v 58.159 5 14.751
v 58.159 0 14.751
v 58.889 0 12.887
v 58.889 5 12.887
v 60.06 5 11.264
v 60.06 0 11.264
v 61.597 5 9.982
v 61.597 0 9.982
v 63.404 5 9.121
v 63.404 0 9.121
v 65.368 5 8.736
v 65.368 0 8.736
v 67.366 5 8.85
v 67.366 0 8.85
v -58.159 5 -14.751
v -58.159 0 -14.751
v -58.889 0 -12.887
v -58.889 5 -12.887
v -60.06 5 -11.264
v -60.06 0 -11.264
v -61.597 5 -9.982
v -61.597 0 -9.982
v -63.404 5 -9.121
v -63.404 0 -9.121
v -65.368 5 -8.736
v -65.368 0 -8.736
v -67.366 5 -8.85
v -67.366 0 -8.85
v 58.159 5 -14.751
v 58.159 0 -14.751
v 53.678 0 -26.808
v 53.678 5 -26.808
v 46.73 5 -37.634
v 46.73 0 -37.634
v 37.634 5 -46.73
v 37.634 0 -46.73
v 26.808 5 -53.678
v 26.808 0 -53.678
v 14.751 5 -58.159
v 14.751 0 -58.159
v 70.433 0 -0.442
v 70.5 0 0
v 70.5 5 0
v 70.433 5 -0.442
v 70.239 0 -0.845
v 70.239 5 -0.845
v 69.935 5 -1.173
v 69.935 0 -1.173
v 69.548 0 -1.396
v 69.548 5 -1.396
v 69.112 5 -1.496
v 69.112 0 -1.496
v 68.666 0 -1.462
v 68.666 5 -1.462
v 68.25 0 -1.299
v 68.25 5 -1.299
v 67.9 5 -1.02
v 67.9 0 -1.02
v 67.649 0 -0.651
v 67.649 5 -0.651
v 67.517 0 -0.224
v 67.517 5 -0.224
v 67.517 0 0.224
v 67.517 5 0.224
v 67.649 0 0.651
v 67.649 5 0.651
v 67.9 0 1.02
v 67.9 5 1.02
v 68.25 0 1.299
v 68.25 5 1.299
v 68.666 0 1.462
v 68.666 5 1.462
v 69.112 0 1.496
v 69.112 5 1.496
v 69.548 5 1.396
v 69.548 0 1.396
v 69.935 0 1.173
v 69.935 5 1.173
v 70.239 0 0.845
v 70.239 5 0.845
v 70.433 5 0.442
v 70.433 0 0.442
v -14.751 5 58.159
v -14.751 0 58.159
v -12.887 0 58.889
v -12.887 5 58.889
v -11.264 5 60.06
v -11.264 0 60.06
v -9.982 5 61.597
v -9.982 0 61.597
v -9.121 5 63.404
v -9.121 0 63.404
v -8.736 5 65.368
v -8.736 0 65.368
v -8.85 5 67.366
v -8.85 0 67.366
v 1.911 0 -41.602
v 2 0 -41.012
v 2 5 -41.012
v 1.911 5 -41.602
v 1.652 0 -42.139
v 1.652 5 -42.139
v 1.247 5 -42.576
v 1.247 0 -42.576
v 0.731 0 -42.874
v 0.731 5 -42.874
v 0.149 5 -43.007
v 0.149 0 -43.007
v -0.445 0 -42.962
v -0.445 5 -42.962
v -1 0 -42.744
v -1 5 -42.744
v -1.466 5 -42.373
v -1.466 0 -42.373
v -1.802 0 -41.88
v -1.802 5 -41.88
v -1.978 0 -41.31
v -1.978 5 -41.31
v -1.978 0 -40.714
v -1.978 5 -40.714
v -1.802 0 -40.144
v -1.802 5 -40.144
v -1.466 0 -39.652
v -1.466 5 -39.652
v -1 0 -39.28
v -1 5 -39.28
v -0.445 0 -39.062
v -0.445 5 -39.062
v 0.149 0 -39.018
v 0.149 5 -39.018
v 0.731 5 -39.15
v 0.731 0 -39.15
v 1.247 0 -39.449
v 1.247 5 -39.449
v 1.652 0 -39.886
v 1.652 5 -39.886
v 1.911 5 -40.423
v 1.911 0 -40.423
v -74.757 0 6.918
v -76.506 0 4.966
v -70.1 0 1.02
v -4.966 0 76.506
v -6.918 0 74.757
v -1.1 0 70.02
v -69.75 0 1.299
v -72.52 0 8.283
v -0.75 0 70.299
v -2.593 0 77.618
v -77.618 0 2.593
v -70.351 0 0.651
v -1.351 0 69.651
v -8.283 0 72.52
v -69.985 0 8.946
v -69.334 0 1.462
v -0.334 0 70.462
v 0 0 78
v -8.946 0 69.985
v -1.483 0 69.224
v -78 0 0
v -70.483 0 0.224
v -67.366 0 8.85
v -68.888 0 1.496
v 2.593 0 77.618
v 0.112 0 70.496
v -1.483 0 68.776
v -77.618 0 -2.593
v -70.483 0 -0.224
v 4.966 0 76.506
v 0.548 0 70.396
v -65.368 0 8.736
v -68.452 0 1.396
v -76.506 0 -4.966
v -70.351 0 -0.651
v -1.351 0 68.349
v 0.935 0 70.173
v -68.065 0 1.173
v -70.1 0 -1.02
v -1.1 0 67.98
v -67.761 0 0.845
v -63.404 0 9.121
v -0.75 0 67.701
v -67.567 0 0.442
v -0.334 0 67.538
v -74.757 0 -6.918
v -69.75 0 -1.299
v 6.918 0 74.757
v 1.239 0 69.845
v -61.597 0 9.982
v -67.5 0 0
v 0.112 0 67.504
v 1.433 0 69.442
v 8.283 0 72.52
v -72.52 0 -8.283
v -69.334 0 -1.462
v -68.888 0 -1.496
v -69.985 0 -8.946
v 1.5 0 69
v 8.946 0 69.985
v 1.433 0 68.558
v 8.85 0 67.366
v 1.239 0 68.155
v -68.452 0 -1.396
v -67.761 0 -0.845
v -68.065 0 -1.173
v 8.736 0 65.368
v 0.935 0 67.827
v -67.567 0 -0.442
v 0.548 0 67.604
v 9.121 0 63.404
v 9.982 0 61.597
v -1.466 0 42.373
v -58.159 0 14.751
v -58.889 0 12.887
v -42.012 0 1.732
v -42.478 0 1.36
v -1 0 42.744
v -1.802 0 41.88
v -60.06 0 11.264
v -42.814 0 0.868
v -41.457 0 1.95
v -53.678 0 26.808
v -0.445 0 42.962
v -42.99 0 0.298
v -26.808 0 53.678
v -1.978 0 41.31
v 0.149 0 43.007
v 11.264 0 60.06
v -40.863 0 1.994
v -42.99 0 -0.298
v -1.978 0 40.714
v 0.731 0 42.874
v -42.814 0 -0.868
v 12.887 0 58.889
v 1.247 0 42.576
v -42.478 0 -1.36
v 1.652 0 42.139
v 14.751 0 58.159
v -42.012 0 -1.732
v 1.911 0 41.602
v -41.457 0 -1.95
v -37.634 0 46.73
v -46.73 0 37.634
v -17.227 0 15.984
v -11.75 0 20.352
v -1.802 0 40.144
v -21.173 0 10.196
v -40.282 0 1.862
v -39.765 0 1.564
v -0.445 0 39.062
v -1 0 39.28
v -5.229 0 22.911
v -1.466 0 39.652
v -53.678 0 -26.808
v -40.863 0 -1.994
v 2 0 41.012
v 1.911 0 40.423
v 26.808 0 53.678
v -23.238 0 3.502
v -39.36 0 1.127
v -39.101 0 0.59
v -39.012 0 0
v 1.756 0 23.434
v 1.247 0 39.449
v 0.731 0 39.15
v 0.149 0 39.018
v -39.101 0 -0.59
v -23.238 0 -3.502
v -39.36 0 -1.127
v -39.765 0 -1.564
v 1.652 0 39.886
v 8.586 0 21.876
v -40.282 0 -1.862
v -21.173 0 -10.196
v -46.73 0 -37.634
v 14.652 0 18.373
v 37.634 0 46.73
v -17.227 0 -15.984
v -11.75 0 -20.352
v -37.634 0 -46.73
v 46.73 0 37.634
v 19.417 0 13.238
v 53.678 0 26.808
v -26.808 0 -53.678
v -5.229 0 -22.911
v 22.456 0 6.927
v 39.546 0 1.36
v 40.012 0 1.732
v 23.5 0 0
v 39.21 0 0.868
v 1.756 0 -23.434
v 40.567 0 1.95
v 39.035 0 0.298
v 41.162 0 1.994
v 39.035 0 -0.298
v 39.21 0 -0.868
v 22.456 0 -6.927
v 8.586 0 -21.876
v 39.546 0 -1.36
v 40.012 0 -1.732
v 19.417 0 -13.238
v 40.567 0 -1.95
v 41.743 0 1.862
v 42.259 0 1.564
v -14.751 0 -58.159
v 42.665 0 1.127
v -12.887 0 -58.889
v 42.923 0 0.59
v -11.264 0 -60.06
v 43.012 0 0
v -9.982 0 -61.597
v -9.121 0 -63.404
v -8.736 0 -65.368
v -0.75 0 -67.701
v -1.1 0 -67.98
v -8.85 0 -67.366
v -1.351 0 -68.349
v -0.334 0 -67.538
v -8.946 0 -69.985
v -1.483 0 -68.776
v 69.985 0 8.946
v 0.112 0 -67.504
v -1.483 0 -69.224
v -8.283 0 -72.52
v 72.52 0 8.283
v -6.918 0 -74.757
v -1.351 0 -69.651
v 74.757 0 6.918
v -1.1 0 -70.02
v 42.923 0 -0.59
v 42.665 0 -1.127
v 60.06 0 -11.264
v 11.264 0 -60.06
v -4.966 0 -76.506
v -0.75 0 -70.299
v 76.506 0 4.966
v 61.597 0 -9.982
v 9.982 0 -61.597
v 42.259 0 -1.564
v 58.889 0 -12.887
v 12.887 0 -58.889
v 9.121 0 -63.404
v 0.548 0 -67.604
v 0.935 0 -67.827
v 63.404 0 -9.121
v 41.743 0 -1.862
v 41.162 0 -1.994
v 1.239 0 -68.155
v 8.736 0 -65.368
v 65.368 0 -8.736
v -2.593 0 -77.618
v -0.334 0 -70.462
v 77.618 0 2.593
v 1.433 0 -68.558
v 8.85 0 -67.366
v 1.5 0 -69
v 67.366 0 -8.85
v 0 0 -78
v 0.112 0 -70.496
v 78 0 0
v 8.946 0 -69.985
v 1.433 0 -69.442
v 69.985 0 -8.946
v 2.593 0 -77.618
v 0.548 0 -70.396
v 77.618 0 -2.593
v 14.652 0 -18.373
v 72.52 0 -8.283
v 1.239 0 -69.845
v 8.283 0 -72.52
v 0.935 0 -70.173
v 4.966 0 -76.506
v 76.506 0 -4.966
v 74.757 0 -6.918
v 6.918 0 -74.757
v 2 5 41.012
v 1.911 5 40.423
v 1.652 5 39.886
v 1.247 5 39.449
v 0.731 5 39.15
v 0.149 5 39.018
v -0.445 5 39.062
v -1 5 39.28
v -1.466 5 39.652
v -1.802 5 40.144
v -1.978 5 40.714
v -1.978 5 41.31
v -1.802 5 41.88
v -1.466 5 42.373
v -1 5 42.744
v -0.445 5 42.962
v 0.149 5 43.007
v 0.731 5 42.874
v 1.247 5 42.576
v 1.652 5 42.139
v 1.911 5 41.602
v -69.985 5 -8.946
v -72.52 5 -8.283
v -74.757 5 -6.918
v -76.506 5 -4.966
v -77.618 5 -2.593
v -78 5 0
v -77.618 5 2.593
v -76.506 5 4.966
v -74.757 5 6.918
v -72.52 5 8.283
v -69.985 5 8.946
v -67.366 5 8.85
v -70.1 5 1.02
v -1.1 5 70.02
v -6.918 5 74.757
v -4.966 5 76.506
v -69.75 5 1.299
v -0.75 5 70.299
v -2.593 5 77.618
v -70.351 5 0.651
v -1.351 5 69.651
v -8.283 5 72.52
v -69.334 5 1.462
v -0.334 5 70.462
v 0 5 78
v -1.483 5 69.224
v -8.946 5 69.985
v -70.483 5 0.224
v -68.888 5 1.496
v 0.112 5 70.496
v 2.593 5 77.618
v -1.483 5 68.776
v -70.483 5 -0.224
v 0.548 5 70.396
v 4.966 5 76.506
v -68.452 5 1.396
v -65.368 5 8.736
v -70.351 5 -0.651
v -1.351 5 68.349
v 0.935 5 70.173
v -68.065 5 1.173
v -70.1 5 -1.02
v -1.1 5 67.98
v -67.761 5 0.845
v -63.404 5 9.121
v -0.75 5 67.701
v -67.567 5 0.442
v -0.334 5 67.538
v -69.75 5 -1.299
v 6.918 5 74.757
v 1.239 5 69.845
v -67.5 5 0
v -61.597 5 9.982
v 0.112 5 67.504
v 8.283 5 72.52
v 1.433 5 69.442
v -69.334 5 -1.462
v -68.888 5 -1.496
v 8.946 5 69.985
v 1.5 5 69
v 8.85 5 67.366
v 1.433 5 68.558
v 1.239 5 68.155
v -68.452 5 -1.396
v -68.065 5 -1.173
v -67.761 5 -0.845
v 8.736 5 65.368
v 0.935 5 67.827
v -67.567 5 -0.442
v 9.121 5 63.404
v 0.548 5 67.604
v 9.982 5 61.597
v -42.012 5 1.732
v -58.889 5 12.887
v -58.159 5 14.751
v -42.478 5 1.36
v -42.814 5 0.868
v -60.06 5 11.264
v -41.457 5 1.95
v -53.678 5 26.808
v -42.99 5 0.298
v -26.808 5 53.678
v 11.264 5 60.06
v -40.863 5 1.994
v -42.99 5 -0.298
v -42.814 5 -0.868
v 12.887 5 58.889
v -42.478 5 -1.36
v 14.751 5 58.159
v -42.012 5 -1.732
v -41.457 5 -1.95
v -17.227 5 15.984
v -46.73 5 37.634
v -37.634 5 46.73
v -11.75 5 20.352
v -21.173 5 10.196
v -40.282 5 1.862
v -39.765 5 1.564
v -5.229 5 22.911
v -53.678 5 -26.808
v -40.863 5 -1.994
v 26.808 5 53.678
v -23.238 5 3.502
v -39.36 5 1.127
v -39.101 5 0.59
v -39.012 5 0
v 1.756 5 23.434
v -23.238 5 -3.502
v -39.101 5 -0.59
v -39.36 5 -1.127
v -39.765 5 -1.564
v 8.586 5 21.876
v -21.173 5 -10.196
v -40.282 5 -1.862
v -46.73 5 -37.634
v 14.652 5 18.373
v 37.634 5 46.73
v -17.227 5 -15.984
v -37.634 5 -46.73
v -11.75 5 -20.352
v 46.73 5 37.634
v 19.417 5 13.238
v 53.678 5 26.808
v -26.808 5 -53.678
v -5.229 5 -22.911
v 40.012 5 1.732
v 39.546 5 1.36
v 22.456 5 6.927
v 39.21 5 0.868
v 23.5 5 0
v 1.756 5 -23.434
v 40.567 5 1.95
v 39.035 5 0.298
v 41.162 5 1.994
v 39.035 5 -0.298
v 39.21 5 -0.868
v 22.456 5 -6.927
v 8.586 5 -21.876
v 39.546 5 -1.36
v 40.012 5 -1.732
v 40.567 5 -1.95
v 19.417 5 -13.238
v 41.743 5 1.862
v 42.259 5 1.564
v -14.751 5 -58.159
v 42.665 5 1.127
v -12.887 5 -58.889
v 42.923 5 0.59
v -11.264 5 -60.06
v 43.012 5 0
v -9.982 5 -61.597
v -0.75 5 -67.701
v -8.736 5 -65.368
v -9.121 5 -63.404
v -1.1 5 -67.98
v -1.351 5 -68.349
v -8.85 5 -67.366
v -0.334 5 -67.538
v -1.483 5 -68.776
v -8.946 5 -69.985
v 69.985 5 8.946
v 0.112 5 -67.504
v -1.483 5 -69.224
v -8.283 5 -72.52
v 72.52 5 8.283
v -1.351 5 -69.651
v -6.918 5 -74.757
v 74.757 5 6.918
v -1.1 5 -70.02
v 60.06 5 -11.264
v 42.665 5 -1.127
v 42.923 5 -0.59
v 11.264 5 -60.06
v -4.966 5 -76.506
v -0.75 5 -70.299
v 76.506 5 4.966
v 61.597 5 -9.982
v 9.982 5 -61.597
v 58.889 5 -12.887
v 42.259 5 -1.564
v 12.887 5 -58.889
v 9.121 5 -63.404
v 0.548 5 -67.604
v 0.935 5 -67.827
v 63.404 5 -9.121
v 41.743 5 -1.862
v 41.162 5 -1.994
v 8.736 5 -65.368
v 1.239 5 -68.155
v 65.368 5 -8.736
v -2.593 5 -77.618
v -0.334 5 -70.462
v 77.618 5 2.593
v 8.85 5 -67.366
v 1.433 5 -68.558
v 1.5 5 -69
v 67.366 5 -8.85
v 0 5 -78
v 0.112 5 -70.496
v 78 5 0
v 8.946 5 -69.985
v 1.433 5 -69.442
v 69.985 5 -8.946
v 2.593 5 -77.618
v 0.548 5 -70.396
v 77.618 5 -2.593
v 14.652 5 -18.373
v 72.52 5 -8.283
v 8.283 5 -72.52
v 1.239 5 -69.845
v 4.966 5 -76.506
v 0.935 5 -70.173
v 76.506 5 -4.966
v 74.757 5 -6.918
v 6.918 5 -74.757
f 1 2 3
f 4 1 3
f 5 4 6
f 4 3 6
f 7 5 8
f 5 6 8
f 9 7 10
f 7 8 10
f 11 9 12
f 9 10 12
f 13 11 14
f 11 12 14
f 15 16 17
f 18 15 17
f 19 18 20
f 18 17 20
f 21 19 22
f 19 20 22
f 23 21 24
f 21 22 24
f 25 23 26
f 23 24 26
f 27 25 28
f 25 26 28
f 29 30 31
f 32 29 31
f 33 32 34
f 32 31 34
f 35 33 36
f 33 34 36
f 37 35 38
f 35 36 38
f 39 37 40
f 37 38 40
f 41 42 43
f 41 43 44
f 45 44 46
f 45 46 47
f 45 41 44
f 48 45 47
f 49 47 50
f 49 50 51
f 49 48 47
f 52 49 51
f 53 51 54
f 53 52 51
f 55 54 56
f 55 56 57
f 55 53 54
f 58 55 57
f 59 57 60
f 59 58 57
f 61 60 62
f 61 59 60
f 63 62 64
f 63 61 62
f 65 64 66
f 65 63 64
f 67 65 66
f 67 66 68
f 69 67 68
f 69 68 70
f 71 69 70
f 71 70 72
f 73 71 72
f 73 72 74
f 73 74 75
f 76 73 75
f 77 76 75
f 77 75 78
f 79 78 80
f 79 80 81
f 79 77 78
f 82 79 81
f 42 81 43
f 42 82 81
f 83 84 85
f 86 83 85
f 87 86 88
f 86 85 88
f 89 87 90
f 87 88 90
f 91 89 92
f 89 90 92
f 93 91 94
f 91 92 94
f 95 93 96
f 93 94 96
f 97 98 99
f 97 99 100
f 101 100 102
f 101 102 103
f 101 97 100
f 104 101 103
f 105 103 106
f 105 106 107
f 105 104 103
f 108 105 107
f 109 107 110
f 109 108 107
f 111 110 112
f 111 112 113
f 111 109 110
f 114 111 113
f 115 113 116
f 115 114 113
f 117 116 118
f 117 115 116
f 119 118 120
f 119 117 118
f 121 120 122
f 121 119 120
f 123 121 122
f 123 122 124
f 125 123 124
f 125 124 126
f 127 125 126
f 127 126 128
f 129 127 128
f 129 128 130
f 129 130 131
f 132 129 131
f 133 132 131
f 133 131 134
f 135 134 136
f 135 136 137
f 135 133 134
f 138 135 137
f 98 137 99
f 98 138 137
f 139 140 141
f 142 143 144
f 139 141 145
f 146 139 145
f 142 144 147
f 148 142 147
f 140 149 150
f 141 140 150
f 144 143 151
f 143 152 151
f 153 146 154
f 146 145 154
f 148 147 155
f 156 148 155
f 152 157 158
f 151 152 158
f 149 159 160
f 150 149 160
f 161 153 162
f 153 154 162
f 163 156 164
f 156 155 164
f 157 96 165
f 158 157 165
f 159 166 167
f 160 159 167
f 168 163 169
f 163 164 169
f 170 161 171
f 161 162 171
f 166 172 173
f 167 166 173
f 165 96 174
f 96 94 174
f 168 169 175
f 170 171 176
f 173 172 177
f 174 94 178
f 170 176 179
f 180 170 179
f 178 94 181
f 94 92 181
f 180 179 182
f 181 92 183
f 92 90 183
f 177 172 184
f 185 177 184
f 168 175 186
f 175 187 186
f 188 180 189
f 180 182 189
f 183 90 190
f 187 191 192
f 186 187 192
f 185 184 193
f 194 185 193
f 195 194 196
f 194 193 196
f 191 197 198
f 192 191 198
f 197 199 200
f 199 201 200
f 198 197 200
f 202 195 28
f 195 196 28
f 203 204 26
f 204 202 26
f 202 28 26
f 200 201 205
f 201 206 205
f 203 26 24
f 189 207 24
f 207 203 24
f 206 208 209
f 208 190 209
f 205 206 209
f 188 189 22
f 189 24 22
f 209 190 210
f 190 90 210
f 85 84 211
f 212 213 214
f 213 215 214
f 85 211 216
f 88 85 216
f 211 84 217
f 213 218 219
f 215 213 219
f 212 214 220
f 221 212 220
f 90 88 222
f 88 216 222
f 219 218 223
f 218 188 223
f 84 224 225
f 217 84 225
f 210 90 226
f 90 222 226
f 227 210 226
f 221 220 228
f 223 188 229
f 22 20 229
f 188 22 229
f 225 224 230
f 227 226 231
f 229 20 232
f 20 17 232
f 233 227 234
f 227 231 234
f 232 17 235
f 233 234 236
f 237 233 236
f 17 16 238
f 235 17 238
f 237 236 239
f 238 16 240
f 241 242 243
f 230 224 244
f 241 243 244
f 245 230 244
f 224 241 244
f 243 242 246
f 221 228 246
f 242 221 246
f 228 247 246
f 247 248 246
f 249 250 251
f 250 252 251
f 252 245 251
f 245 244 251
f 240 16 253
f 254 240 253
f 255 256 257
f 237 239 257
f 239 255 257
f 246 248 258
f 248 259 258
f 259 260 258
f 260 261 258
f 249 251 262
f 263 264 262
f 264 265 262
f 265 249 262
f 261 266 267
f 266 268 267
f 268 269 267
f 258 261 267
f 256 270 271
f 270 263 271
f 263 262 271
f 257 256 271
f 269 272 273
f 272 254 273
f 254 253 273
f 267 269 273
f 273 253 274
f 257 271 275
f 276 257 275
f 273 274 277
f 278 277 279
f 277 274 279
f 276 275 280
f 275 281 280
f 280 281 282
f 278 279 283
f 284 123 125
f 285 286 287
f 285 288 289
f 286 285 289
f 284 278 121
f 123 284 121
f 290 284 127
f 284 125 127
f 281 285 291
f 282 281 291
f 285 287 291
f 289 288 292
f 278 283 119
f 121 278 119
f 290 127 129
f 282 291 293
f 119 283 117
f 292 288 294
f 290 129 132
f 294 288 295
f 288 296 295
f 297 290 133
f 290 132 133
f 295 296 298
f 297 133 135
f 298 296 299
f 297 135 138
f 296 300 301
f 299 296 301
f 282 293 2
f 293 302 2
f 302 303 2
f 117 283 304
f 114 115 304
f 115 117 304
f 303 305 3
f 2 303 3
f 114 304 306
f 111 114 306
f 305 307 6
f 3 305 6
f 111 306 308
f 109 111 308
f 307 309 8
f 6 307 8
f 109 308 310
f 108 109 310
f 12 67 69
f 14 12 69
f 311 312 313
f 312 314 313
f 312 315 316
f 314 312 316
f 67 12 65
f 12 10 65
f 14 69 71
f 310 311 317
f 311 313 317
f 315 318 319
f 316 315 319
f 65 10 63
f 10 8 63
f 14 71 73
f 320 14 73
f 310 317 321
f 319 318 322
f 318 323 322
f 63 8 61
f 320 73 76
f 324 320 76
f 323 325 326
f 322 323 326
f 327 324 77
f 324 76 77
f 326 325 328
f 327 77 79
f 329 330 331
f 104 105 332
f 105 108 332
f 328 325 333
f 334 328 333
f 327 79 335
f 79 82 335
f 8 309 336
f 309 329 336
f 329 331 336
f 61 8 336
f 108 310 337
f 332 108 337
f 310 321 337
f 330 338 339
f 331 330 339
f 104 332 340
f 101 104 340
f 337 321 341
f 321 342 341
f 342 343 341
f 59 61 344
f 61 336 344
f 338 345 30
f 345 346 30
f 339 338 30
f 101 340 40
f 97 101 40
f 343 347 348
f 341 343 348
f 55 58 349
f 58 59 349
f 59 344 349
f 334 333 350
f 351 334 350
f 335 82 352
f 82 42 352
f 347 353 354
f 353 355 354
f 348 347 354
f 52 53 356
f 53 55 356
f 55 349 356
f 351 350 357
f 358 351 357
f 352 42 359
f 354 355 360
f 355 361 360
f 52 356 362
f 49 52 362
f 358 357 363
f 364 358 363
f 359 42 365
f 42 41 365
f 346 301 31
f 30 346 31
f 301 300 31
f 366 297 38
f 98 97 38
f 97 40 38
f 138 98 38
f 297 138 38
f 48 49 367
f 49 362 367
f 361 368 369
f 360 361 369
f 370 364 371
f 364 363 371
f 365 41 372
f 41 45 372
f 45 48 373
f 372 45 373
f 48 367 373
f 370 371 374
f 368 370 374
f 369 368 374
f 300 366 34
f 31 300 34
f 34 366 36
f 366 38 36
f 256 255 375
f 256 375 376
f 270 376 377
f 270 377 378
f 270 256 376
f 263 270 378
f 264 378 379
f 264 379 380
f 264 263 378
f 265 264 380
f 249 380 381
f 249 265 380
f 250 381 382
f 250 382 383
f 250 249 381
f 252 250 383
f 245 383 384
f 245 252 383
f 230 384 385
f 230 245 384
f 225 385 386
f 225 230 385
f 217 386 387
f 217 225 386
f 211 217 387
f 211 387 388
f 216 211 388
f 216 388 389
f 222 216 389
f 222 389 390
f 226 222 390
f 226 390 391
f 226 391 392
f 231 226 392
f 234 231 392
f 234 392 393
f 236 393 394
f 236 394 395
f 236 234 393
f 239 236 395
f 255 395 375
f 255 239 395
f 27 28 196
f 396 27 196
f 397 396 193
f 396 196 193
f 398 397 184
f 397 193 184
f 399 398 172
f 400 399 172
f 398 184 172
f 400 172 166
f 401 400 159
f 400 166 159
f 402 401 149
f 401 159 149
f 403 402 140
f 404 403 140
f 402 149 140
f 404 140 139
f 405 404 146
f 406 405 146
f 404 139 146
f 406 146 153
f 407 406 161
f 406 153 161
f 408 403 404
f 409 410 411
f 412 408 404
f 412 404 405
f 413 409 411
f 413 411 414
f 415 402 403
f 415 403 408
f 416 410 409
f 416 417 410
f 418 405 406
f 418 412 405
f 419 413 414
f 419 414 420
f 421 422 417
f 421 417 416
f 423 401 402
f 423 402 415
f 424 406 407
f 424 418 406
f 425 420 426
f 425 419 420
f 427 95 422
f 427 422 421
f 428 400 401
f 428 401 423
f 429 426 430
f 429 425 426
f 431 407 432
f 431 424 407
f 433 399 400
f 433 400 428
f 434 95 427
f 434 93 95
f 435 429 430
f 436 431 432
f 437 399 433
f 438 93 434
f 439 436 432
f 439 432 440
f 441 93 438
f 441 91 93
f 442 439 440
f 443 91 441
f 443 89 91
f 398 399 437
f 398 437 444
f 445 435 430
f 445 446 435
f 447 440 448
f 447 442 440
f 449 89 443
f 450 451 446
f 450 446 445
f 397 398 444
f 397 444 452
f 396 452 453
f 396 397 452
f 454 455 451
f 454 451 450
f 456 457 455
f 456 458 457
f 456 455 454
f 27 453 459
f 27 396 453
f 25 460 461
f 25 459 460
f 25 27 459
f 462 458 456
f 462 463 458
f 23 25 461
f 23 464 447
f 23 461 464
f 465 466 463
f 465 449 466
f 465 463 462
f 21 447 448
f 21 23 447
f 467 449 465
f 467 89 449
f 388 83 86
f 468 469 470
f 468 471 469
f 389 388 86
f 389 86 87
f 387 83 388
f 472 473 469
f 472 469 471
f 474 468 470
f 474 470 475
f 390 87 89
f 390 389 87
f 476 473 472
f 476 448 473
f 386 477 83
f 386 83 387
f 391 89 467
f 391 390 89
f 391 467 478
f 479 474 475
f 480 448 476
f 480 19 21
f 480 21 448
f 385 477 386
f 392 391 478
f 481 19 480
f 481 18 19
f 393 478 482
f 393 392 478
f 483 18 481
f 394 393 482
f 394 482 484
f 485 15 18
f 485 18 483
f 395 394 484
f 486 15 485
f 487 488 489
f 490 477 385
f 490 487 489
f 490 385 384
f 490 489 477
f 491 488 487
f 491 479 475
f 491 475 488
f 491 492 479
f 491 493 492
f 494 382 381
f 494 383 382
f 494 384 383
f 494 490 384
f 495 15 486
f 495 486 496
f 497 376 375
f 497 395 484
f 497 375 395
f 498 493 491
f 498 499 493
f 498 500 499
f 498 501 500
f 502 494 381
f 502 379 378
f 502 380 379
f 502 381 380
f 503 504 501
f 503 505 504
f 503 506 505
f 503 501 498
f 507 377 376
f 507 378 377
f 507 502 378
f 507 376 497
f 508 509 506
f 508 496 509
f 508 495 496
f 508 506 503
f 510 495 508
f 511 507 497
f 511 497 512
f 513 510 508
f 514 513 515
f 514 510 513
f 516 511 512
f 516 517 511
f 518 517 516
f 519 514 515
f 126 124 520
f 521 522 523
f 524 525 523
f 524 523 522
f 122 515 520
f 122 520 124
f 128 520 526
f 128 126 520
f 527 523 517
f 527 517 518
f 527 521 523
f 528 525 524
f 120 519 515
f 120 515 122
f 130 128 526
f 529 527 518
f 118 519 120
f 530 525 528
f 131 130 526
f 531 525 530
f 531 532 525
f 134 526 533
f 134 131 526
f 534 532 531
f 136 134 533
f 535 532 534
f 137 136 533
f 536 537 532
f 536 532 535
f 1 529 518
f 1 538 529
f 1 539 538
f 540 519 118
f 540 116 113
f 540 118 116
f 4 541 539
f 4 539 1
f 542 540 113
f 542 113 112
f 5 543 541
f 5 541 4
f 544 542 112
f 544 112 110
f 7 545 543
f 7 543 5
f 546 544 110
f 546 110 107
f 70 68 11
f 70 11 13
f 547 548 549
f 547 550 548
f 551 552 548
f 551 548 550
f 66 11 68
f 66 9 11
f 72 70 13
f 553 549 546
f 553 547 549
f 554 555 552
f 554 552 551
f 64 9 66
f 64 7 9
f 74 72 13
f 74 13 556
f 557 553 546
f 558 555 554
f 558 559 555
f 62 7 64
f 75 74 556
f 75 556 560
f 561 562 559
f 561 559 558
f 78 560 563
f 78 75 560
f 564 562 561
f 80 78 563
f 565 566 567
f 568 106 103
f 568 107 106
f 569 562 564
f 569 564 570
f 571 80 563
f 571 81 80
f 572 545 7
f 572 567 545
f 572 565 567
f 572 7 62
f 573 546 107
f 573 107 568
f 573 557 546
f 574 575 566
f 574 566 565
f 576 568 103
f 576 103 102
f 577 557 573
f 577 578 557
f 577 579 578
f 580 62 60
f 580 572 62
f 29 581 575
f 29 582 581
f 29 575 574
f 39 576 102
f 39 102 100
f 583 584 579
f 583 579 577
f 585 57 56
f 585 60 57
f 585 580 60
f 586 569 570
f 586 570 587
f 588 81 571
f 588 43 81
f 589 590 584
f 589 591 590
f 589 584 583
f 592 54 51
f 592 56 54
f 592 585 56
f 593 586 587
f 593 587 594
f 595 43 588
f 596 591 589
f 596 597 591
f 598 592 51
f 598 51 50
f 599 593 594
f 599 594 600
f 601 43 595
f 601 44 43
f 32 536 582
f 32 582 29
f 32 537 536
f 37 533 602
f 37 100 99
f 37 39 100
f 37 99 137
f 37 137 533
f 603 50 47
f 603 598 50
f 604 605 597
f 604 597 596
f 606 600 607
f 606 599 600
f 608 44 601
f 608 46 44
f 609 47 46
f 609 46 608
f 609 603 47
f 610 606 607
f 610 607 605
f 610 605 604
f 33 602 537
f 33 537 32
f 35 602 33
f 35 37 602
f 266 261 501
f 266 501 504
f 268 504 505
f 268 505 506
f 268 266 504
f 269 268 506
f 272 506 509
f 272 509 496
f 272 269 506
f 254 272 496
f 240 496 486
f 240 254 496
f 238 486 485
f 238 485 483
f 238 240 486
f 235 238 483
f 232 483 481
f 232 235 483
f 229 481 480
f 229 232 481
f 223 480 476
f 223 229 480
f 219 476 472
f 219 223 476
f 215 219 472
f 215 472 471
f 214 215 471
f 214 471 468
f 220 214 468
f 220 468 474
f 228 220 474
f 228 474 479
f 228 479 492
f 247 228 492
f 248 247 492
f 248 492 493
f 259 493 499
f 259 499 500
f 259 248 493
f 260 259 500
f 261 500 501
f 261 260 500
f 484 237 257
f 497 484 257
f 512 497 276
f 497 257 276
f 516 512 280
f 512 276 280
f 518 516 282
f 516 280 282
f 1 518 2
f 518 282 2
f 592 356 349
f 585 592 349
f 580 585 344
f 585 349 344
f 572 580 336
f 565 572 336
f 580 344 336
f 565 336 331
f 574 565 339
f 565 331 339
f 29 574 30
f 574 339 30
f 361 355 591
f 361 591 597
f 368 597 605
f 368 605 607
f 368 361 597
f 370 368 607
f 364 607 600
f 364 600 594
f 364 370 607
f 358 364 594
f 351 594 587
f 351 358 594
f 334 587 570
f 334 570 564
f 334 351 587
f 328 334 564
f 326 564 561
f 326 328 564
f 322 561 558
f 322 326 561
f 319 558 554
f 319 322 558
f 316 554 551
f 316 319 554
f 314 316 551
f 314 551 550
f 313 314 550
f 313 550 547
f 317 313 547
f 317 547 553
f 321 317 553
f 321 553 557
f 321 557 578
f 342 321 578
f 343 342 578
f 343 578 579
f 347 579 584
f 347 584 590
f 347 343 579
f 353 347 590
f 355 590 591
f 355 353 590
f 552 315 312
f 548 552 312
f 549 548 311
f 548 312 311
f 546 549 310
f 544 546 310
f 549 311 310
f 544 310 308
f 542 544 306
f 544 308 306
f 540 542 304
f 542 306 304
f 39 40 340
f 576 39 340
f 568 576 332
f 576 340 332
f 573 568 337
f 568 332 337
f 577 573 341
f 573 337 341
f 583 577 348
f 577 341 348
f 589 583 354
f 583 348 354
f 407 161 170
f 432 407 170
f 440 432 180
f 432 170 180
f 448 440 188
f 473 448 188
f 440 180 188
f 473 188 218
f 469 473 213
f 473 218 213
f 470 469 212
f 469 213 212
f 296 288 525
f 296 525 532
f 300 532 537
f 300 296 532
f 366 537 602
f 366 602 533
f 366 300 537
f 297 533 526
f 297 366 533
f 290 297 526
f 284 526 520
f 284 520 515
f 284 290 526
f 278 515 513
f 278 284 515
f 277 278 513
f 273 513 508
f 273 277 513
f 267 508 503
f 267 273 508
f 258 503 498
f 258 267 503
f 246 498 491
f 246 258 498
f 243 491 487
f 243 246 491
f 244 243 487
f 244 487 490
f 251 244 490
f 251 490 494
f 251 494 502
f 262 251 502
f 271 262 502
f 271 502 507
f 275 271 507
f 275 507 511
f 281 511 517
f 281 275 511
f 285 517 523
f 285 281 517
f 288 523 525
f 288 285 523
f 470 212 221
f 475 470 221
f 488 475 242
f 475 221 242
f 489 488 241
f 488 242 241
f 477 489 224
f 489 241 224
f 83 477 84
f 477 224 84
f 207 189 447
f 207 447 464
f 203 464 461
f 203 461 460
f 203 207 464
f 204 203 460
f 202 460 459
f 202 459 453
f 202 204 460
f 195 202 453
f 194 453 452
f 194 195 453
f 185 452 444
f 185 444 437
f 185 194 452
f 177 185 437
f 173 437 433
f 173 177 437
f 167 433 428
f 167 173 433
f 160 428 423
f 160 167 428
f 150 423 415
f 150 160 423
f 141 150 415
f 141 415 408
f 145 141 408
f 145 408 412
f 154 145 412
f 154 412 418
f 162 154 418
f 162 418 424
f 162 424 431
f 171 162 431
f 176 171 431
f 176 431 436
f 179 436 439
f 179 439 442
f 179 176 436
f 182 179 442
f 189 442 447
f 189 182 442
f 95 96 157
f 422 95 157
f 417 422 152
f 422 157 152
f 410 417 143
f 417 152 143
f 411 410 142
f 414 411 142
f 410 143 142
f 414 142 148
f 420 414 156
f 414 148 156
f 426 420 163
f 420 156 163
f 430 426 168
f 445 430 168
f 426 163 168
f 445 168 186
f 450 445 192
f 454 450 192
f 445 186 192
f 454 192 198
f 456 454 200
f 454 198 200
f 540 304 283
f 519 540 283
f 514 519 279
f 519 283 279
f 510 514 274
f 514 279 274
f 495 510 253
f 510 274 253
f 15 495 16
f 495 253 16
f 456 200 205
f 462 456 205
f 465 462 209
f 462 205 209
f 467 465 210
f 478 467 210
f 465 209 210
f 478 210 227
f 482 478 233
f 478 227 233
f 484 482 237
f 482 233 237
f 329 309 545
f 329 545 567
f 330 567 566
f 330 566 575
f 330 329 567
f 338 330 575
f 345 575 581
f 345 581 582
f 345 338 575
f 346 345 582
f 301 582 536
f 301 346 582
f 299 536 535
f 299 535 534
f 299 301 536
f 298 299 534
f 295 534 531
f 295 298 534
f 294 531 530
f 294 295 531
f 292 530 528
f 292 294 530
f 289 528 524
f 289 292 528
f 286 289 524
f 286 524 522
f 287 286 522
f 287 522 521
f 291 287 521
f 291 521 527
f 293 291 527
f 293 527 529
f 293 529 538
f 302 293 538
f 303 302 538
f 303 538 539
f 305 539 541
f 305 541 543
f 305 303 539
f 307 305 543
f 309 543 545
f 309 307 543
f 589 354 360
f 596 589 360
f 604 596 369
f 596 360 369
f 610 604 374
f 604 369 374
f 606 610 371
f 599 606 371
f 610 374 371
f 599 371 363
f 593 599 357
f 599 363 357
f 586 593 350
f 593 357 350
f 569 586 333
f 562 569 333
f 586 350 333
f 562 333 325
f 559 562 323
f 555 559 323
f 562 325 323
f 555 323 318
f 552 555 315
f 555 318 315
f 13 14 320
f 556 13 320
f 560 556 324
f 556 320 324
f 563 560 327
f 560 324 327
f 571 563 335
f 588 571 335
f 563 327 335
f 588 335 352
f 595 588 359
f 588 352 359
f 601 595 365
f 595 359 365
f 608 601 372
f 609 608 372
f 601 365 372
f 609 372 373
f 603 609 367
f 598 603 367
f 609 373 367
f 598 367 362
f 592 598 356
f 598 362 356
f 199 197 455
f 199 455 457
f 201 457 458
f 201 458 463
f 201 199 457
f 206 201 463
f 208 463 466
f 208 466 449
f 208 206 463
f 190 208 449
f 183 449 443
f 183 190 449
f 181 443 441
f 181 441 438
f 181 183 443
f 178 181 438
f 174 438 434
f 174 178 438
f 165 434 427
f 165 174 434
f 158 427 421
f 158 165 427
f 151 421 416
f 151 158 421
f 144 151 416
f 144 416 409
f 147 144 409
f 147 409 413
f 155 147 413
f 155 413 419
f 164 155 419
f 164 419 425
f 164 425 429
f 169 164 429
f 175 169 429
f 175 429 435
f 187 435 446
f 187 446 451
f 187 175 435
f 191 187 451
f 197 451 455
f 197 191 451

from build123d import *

# Parameters (mm, degrees)
SKETCH1_R           = 23.5
SKETCH1_R_2         = 1.5
SKETCH1_R_3         = 2
BOSS_EXTRUDE1_DEPTH = 5


with BuildPart() as part:
    # Sketch1 → Boss-Extrude1 (new body)
    with BuildSketch(Plane(origin=(0, 0, 0), x_dir=(1, 0, 0), z_dir=(0, 1, 0))):
        with BuildLine():
            ThreePointArc((58.158567775, 14.750626914), (42.426406871, 42.426406871), (14.750626914, 58.158567775))
            ThreePointArc((14.750626914, 58.158567775), (9.981753959, 61.596635254), (8.850376149, 67.3657289))
            ThreePointArc((8.850376149, 67.3657289), (0, 78), (-8.850376149, 67.3657289))
            ThreePointArc((-8.850376149, 67.3657289), (-9.981753959, 61.596635254), (-14.750626914, 58.158567775))
            ThreePointArc((-14.750626914, 58.158567775), (-42.426406871, 42.426406871), (-58.158567775, 14.750626914))
            ThreePointArc((-58.158567775, 14.750626914), (-61.596635254, 9.981753959), (-67.3657289, 8.850376149))
            ThreePointArc((-67.3657289, 8.850376149), (-78, 0), (-67.3657289, -8.850376149))
            ThreePointArc((-67.3657289, -8.850376149), (-61.596635254, -9.981753959), (-58.158567775, -14.750626914))
            ThreePointArc((-58.158567775, -14.750626914), (-42.426406871, -42.426406871), (-14.750626914, -58.158567775))
            ThreePointArc((-14.750626914, -58.158567775), (-9.981753959, -61.596635254), (-8.850376149, -67.3657289))
            ThreePointArc((-8.850376149, -67.3657289), (0, -78), (8.850376149, -67.3657289))
            ThreePointArc((8.850376149, -67.3657289), (9.981753959, -61.596635254), (14.750626914, -58.158567775))
            ThreePointArc((14.750626914, -58.158567775), (42.426406871, -42.426406871), (58.158567775, -14.750626914))
            ThreePointArc((58.158567775, -14.750626914), (61.596635254, -9.981753959), (67.3657289, -8.850376149))
            ThreePointArc((67.3657289, -8.850376149), (78, 0), (67.3657289, 8.850376149))
            ThreePointArc((67.3657289, 8.850376149), (61.596635254, 9.981753959), (58.158567775, 14.750626914))
        make_face()
        Circle(SKETCH1_R, mode=Mode.SUBTRACT)
        with Locations((69, 0)):
            Circle(SKETCH1_R_2, mode=Mode.SUBTRACT)
        with Locations((41.01219331, 0)):
            Circle(SKETCH1_R_3, mode=Mode.SUBTRACT)
        with Locations((0, 41.01219331)):
            Circle(SKETCH1_R_3, mode=Mode.SUBTRACT)
        with Locations((-41.01219331, 0)):
            Circle(SKETCH1_R_3, mode=Mode.SUBTRACT)
        with Locations((0, -41.01219331)):
            Circle(SKETCH1_R_3, mode=Mode.SUBTRACT)
        with Locations((0, 69)):
            Circle(SKETCH1_R_2, mode=Mode.SUBTRACT)
        with Locations((0, -69)):
            Circle(SKETCH1_R_2, mode=Mode.SUBTRACT)
        with Locations((-69, 0)):
            Circle(SKETCH1_R_2, mode=Mode.SUBTRACT)
    extrude(amount=BOSS_EXTRUDE1_DEPTH)


solid = part.part
